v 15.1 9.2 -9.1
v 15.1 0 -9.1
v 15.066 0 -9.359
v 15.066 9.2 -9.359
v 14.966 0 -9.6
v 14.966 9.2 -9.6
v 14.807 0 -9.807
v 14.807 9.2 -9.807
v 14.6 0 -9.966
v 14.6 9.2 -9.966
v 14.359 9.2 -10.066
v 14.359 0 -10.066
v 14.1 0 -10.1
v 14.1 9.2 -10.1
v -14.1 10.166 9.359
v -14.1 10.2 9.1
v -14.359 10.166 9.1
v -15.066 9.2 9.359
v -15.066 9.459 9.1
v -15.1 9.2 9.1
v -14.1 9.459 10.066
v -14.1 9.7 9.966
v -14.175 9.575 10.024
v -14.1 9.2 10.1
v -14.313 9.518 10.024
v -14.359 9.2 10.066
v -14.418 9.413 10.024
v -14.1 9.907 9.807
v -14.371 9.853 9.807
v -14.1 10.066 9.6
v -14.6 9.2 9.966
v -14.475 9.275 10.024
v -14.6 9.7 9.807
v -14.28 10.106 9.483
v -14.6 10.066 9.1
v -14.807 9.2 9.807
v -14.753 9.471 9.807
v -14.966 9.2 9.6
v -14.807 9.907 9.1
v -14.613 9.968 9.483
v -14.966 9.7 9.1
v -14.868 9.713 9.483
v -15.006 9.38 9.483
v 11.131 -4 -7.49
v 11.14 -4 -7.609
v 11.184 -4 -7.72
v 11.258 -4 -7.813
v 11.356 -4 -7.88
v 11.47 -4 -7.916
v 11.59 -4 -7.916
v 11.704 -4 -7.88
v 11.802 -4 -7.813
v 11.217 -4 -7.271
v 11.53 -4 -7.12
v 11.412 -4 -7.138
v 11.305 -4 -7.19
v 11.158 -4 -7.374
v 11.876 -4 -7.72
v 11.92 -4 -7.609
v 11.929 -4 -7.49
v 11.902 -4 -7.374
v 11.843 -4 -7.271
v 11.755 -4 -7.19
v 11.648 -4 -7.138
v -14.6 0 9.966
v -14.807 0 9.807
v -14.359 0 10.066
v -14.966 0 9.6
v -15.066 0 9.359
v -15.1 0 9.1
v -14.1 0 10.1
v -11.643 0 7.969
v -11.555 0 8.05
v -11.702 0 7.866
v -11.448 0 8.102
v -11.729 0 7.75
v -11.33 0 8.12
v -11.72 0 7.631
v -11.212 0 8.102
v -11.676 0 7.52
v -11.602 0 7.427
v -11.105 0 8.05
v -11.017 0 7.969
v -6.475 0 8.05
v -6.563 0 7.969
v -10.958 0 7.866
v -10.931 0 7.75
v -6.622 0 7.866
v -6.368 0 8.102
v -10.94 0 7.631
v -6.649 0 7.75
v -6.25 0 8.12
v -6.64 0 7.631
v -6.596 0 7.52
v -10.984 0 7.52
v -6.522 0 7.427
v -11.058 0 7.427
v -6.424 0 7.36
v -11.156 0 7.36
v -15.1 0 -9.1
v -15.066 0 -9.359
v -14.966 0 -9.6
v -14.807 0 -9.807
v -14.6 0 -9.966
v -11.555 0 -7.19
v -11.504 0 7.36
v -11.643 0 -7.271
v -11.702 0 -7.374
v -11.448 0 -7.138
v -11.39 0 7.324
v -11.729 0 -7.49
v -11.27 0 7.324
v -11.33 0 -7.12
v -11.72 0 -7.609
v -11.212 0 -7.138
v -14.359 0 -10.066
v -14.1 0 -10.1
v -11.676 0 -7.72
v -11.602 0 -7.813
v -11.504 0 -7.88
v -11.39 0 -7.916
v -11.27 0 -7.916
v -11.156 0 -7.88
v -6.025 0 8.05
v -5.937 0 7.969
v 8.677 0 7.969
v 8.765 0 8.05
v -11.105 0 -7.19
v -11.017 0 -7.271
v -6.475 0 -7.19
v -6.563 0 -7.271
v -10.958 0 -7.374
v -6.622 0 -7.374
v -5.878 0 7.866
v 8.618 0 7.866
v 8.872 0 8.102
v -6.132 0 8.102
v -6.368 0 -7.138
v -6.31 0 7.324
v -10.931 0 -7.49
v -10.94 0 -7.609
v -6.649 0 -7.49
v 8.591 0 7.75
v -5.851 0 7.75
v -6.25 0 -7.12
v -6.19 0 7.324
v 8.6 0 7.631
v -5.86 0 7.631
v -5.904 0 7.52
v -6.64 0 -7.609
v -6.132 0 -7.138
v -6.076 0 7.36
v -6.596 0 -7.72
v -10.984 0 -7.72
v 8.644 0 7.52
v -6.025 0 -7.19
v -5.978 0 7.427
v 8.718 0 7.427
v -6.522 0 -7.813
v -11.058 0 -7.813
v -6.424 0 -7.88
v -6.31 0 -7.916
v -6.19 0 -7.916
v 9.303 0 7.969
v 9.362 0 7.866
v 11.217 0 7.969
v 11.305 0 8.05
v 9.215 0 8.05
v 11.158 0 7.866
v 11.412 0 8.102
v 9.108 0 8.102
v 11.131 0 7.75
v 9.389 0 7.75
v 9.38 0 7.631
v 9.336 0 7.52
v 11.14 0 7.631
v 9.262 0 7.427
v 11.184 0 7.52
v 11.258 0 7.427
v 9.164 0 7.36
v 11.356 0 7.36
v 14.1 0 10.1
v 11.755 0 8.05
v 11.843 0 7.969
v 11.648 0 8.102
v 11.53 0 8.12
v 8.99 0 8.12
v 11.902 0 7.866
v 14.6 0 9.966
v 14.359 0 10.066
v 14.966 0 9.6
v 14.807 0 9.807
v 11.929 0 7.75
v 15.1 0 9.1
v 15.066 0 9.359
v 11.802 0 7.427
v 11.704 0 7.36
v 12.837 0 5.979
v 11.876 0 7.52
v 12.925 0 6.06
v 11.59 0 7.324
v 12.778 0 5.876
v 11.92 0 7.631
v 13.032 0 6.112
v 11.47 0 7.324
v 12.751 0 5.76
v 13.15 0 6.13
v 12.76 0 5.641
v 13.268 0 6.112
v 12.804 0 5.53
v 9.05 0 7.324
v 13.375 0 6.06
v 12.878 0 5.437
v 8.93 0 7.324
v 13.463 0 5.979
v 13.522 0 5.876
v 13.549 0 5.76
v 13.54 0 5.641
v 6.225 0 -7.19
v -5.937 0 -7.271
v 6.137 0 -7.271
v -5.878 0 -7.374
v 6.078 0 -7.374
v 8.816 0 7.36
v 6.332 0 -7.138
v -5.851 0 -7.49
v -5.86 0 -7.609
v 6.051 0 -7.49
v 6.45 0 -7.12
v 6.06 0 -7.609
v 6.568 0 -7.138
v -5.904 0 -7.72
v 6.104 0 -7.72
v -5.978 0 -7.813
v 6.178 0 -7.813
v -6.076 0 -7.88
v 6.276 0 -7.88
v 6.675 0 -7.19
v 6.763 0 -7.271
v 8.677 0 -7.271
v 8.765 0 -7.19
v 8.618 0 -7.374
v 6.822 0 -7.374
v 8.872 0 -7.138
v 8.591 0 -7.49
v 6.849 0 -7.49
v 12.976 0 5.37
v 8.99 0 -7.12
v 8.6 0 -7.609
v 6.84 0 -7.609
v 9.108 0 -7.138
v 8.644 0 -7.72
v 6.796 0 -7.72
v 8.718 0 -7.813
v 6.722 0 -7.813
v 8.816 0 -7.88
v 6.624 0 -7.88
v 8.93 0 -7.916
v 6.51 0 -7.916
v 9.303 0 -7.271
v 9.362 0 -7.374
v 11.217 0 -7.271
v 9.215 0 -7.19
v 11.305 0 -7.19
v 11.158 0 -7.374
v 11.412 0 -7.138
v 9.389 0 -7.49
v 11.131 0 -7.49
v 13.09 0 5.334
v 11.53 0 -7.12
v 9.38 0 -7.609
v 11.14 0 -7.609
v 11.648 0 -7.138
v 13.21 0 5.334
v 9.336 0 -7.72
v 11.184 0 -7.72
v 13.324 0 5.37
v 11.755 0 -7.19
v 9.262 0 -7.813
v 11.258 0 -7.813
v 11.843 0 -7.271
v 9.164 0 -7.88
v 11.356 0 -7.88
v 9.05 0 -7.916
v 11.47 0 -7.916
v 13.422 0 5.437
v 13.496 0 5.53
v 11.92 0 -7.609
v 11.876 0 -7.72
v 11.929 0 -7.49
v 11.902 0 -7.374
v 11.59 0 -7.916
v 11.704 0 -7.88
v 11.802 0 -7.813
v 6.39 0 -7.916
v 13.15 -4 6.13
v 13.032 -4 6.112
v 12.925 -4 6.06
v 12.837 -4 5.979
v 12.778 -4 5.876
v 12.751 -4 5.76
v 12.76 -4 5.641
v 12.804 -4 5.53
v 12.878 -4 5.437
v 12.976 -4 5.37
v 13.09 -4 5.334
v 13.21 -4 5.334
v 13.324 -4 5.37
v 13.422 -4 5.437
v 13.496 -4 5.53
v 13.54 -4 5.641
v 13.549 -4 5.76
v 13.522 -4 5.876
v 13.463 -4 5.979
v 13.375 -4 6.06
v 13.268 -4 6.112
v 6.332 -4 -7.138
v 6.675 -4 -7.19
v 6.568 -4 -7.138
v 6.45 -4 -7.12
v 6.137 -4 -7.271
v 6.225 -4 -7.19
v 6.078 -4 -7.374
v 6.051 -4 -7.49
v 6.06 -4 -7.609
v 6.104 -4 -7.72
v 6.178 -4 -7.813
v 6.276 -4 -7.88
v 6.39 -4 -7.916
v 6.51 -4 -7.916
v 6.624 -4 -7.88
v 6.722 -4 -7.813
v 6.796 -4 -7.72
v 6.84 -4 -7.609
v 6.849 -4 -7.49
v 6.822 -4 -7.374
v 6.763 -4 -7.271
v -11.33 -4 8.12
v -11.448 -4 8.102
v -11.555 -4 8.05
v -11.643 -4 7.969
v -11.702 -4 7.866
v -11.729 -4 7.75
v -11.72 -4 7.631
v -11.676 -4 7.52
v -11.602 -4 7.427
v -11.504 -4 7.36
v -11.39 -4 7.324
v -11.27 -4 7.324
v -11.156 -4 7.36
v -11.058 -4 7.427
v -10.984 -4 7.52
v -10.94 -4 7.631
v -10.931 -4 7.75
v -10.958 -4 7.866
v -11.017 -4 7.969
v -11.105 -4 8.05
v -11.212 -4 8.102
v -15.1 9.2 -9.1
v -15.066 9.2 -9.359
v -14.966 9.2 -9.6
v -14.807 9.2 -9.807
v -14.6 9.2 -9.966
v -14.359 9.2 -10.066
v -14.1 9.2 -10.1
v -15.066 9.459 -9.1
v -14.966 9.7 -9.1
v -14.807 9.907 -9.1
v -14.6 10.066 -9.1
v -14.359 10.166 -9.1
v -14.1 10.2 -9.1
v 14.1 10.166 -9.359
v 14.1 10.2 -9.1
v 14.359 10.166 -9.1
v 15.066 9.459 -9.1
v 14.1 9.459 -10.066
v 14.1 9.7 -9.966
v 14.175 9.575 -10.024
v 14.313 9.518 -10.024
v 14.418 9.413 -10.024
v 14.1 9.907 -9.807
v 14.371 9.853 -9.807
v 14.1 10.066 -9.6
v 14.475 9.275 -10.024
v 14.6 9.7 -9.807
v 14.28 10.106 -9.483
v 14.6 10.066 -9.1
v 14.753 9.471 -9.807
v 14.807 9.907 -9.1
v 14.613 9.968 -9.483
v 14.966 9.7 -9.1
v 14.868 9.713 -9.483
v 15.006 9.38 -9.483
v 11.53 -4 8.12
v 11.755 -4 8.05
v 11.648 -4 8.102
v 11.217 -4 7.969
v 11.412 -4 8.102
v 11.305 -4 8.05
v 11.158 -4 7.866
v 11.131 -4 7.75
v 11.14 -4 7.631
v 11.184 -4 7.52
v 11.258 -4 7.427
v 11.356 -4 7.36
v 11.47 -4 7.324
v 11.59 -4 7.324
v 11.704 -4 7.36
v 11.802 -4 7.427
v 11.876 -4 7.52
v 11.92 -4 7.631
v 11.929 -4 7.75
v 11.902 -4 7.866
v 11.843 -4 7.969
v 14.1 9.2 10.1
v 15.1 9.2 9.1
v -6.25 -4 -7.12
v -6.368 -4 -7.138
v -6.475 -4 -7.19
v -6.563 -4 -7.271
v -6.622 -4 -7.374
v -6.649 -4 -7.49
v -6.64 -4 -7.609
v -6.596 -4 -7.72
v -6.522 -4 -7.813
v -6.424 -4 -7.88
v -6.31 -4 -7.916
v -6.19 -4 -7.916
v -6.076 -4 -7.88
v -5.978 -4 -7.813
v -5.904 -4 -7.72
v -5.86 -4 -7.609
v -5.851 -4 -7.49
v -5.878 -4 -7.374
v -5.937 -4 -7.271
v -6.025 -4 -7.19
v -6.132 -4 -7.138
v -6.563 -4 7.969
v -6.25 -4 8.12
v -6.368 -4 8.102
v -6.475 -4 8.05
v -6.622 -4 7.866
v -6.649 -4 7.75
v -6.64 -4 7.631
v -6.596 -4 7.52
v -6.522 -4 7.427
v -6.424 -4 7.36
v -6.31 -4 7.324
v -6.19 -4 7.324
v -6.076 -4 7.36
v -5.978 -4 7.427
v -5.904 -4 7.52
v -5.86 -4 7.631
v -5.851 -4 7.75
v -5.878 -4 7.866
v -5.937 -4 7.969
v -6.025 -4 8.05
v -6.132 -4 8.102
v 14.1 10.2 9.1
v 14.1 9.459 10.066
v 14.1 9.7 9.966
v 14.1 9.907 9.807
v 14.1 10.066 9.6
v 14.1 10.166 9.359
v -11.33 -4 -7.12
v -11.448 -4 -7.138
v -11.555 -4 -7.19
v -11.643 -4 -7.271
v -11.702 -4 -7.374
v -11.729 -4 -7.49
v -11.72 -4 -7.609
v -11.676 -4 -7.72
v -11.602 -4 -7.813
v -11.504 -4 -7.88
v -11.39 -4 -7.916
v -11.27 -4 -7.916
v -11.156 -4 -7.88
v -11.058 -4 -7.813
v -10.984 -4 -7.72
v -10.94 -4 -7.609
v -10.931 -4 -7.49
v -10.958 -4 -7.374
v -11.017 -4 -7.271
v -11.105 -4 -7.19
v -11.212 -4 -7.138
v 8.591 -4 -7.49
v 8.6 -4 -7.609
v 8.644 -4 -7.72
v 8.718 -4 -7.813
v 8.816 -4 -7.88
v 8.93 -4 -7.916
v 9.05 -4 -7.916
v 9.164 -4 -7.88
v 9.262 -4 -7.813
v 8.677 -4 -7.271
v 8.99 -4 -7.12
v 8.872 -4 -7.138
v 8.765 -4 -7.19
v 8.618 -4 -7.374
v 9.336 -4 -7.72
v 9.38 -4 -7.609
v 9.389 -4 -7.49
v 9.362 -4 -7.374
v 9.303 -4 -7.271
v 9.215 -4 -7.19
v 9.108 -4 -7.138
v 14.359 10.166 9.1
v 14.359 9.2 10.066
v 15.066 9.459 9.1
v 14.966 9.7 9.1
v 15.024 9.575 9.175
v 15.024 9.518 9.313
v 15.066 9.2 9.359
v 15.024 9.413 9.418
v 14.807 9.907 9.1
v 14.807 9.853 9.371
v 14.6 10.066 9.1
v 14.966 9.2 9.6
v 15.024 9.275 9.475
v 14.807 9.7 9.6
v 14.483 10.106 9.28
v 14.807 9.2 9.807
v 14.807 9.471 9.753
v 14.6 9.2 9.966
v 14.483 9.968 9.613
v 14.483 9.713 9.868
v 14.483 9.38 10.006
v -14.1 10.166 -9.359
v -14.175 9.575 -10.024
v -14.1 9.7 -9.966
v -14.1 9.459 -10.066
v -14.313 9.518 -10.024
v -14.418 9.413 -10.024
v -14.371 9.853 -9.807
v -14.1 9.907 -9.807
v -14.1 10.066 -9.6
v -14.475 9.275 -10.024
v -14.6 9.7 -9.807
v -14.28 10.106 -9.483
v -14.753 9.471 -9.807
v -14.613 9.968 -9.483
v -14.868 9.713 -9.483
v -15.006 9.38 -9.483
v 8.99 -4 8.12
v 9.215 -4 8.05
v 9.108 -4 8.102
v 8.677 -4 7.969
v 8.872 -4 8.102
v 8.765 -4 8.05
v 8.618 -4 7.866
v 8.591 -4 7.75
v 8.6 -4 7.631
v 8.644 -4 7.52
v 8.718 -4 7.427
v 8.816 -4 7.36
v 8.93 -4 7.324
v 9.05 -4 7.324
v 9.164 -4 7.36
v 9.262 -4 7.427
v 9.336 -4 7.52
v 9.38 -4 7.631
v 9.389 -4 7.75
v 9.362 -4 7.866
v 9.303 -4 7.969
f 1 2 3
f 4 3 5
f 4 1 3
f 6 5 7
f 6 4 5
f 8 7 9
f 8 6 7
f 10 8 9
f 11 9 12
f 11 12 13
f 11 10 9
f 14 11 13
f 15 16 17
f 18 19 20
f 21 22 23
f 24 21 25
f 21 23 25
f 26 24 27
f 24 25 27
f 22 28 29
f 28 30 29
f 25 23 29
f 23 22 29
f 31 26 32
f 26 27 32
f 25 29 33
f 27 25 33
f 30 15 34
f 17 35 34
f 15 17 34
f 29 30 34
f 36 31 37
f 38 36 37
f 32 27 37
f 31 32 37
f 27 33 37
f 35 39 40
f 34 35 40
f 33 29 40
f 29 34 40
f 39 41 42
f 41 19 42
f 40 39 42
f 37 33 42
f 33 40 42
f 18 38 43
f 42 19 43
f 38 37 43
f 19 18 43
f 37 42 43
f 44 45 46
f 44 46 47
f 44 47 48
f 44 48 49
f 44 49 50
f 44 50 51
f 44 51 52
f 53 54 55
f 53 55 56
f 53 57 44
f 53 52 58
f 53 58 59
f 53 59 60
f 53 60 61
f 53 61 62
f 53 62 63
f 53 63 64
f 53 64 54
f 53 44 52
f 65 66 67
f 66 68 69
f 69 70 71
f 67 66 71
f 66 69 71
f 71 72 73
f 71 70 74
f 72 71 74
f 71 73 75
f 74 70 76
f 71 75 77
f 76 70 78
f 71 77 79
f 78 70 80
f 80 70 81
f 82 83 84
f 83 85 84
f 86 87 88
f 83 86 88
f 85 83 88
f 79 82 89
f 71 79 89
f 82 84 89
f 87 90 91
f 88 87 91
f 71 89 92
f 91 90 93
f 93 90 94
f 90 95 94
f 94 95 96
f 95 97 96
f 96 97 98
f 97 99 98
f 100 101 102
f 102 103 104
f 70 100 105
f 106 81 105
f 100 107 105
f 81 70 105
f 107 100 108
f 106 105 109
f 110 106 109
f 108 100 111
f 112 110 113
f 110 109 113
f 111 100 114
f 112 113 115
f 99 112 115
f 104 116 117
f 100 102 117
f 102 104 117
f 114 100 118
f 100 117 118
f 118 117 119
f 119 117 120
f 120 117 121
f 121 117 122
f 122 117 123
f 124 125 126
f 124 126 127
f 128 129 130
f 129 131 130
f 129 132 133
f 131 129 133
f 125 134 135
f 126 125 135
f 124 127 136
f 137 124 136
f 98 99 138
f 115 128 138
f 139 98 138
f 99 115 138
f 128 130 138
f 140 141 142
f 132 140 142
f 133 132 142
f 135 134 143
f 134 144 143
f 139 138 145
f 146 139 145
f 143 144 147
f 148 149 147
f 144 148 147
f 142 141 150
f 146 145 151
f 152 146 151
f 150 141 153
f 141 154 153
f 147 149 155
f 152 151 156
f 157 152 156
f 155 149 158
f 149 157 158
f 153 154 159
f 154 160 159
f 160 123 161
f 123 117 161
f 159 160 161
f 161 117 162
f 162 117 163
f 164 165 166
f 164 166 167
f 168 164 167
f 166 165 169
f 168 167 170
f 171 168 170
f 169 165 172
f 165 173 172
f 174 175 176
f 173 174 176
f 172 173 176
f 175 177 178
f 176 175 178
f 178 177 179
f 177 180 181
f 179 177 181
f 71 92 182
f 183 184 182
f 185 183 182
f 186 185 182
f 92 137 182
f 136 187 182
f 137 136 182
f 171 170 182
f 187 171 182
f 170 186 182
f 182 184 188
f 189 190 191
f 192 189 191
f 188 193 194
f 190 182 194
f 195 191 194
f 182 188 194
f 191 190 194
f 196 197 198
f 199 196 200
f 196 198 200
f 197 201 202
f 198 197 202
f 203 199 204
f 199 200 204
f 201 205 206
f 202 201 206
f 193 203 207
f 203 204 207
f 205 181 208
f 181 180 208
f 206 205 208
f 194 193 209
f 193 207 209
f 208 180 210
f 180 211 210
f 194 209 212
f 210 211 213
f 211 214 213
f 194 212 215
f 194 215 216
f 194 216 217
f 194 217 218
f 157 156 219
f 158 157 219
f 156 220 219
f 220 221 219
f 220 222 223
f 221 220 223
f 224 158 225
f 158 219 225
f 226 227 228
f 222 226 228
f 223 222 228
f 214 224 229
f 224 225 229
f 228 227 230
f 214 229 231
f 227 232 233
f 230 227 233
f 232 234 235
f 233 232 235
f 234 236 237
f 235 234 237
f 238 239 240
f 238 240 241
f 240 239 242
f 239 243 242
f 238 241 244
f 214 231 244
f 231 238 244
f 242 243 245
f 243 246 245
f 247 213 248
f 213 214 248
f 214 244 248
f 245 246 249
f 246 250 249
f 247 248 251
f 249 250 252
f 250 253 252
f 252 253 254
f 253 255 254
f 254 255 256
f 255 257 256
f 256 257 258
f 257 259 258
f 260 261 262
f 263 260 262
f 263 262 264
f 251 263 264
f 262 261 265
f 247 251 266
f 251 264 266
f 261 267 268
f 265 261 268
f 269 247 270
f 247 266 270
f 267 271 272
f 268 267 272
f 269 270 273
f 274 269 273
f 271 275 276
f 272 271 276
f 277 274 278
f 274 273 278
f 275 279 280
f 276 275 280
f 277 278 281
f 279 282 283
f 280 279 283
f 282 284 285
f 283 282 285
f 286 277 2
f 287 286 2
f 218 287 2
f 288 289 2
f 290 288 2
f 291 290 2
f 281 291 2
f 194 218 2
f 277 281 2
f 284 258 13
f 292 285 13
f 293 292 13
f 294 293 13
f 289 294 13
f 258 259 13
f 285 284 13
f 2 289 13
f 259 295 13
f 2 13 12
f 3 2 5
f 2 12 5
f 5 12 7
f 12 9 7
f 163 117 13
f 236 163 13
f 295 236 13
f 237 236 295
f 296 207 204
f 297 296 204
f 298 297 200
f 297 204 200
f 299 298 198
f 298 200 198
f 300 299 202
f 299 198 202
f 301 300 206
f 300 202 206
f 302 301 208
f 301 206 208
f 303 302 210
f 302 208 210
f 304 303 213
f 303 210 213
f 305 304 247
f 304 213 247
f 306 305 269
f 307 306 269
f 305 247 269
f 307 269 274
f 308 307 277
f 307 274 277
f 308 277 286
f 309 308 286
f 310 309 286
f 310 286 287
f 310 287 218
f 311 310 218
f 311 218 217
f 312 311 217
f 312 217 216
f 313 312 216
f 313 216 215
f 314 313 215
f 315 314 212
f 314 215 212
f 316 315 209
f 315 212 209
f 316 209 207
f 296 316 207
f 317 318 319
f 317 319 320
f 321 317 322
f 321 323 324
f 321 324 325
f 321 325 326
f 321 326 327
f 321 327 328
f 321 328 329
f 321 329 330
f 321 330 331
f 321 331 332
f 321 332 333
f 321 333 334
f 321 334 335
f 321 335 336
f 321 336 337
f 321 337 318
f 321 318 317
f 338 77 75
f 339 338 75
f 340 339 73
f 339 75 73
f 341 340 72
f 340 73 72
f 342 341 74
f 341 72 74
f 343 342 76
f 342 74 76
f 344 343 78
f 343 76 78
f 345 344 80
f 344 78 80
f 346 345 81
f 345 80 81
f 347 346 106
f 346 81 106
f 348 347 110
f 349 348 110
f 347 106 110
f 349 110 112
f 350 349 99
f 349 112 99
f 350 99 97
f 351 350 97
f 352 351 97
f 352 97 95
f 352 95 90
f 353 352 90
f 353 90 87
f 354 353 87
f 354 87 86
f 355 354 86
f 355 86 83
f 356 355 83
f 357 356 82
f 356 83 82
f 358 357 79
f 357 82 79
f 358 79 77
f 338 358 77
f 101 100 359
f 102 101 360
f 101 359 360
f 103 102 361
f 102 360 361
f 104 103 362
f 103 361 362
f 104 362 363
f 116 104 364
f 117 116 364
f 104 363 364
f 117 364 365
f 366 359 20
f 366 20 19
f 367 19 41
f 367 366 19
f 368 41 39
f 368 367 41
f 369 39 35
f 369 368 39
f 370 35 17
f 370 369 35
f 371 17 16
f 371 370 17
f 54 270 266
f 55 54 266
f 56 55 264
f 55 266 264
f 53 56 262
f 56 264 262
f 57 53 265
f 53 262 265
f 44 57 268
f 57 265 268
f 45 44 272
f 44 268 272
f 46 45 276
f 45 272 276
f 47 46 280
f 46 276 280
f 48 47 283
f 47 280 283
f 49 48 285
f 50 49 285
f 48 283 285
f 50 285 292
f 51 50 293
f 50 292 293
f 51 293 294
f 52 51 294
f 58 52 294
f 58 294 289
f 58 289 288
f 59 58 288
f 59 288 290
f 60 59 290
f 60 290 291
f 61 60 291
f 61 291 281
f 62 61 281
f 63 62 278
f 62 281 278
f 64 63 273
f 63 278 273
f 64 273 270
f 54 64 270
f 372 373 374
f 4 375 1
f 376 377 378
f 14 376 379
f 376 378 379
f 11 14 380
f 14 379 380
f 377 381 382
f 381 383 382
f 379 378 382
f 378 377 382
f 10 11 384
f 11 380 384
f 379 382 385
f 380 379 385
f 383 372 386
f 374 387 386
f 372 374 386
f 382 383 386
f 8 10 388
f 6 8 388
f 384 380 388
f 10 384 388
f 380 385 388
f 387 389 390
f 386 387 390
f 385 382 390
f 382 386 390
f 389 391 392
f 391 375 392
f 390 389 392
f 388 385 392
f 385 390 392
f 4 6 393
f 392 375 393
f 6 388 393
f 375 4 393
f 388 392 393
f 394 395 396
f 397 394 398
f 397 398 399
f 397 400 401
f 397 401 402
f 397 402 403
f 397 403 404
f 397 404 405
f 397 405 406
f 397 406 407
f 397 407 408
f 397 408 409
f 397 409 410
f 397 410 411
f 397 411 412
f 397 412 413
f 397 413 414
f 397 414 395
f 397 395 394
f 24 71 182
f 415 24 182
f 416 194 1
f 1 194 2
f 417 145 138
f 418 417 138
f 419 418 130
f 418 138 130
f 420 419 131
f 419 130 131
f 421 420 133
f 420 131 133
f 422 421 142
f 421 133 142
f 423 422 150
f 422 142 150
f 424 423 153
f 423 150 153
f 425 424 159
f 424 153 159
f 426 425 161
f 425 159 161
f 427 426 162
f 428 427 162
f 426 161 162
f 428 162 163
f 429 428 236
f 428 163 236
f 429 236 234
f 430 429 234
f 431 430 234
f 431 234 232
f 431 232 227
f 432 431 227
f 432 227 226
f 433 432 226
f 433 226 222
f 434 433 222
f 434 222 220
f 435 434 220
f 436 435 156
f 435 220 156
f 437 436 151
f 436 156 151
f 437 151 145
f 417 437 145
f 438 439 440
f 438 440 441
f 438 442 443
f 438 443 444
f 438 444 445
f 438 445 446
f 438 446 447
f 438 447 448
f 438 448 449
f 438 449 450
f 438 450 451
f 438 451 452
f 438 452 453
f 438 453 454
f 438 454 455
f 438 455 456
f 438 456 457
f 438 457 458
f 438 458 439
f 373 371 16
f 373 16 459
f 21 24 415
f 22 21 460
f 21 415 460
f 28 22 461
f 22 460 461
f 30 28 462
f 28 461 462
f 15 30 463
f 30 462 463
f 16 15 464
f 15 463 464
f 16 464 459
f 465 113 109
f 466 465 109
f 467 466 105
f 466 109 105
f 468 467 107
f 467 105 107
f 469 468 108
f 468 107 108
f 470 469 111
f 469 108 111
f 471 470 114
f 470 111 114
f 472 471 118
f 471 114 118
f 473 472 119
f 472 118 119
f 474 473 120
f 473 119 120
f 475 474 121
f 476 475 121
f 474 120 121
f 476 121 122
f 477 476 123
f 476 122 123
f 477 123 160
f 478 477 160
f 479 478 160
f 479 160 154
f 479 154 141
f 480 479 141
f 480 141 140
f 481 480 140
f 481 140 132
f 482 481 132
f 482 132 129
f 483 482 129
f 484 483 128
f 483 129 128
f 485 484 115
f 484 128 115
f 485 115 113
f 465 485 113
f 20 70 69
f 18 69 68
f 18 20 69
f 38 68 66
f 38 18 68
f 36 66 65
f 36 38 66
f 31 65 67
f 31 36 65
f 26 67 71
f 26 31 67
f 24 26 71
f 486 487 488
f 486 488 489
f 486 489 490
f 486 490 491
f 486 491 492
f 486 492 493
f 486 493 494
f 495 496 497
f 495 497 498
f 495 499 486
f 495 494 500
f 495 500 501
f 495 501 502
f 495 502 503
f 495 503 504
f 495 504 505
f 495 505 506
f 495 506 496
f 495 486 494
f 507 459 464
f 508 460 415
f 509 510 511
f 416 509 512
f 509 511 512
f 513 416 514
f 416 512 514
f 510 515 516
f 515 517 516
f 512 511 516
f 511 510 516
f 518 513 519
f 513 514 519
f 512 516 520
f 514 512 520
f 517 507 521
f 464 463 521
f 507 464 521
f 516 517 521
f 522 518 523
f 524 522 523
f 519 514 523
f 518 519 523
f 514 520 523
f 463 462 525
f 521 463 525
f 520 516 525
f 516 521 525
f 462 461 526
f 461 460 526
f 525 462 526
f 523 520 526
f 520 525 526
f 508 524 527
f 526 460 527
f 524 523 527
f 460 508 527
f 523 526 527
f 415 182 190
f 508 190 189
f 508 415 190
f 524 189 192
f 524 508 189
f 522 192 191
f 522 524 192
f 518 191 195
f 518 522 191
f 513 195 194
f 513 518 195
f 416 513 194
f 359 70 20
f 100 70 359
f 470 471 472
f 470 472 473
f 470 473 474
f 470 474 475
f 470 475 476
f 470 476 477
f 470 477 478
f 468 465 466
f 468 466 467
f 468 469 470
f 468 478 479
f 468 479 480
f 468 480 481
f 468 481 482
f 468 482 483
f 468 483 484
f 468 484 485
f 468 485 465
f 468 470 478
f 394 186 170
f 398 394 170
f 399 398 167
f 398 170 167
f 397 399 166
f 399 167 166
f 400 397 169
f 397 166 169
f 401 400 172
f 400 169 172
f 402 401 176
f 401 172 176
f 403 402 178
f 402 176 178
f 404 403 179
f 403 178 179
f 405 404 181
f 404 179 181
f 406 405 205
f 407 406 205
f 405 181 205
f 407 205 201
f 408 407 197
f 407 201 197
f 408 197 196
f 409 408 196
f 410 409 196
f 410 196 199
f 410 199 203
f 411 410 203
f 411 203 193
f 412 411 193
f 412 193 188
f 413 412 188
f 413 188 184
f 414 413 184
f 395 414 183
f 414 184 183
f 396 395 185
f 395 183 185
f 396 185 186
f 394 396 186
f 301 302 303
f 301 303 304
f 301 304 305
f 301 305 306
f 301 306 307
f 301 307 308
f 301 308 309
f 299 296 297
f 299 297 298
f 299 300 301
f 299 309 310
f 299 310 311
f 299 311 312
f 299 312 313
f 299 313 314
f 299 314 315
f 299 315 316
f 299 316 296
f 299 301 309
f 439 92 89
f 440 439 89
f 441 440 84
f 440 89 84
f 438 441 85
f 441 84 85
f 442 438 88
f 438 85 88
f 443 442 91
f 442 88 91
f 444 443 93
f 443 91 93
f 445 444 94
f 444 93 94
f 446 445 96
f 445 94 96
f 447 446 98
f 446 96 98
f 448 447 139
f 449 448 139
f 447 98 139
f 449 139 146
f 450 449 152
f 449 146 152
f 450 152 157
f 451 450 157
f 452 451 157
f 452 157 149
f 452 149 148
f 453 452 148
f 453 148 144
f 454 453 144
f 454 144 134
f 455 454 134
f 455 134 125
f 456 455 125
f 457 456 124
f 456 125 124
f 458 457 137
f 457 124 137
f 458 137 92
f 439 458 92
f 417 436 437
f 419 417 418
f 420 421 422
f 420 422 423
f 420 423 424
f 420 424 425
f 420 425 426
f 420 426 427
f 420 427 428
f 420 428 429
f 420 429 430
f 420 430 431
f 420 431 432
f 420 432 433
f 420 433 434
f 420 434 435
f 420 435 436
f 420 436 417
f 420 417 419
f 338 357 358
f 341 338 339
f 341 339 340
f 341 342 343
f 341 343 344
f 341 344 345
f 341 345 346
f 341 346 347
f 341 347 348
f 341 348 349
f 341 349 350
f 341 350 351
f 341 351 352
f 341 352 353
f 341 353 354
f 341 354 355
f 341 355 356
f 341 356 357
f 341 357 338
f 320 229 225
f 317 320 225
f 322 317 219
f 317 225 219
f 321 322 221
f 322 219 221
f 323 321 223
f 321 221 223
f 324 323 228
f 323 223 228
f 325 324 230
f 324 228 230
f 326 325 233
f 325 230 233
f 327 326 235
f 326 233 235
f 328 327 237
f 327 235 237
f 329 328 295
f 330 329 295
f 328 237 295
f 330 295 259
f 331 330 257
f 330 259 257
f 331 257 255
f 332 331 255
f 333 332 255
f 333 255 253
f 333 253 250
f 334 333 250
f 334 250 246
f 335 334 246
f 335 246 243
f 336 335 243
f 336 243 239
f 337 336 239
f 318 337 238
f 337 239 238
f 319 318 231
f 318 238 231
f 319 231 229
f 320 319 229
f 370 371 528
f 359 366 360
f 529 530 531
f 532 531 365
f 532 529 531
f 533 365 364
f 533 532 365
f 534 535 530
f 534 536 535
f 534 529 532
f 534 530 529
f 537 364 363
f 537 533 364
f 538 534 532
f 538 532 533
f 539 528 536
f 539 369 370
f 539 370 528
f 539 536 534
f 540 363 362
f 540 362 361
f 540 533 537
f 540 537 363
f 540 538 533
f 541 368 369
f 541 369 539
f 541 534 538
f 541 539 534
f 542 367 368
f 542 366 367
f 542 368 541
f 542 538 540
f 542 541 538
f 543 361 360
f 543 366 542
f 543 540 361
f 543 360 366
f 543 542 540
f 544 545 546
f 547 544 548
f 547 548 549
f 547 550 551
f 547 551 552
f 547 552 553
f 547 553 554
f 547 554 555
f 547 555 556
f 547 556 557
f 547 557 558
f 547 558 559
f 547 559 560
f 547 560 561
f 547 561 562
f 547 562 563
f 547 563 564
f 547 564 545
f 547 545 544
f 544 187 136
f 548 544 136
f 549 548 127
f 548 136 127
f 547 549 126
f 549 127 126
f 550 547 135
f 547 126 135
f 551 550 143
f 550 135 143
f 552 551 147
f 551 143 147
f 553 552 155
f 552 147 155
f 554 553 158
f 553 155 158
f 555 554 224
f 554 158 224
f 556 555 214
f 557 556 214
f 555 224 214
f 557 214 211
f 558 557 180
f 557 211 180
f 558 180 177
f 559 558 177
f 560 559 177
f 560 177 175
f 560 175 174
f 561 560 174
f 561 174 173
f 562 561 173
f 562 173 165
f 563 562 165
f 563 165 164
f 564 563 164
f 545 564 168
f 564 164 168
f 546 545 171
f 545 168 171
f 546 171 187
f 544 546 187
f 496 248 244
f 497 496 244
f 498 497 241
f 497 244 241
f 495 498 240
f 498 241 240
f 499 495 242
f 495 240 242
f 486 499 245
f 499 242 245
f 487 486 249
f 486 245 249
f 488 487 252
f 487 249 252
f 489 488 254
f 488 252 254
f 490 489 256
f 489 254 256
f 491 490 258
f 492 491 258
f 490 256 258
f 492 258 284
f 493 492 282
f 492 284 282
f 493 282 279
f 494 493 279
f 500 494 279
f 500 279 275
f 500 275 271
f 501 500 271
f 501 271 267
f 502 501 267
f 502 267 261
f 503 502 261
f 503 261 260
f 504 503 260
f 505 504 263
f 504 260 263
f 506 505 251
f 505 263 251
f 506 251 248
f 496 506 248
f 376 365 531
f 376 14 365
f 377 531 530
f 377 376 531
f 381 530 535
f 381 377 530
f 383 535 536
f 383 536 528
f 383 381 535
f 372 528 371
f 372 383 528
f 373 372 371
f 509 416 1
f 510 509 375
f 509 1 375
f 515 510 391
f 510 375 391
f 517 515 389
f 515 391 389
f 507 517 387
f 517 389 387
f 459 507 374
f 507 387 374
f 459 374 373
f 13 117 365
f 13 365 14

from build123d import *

# Parameters (mm, degrees)
SKETCH_1_W      = 30.2
SKETCH_1_H      = 20.2
EXTRUDE_1_DEPTH = 10.2
FILLET_1_R      = 1
SKETCH_2_R      = 0.4
EXTRUDE_3_DEPTH = 4


with BuildPart() as part:
    # Эскиз1 → Бобышка-Вытянуть1 (new body)
    with BuildSketch(Plane(origin=(0, 0, 0), x_dir=(1, 0, 0), z_dir=(0, 1, 0))):
        Rectangle(SKETCH_1_W, SKETCH_1_H)
    extrude(amount=EXTRUDE_1_DEPTH)

    # Скругление1
    fillet_1_edges = [part.edges().sort_by_distance(p)[0] for p in [
        (-15.1, 10.2, 0),
        (0, 10.2, 10.1),
        (15.1, 10.2, 0),
        (0, 10.2, -10.1),
        (15.1, 5.1, 10.1),
        (-15.1, 5.1, 10.1),
        (-15.1, 5.1, -10.1),
        (15.1, 5.1, -10.1),
    ]]
    fillet(fillet_1_edges, radius=FILLET_1_R)

    # Эскиз2 → Бобышка-Вытянуть3 (add)
    with BuildSketch(Plane.XZ):
        with Locations(Location((11.53, 7.72, 0), (0, 0, 90))):
            Circle(SKETCH_2_R)
        with Locations(Location((13.15, 5.73, 0), (0, 0, 90))):
            Circle(SKETCH_2_R)
        with Locations(Location((8.99, 7.72, 0), (0, 0, 90))):
            Circle(SKETCH_2_R)
        with Locations(Location((6.45, -7.52, 0), (0, 0, 90))):
            Circle(SKETCH_2_R)
        with Locations(Location((-6.25, 7.72, 0), (0, 0, 90))):
            Circle(SKETCH_2_R)
        with Locations(Location((-11.33, 7.72, 0), (0, 0, 90))):
            Circle(SKETCH_2_R)
        with Locations(Location((-11.33, -7.52, 0), (0, 0, 90))):
            Circle(SKETCH_2_R)
        with Locations(Location((-6.25, -7.52, 0), (0, 0, 90))):
            Circle(SKETCH_2_R)
        with Locations(Location((8.99, -7.52, 0), (0, 0, 90))):
            Circle(SKETCH_2_R)
        with Locations(Location((11.53, -7.52, 0), (0, 0, 90))):
            Circle(SKETCH_2_R)
    extrude(amount=EXTRUDE_3_DEPTH)


solid = part.part
